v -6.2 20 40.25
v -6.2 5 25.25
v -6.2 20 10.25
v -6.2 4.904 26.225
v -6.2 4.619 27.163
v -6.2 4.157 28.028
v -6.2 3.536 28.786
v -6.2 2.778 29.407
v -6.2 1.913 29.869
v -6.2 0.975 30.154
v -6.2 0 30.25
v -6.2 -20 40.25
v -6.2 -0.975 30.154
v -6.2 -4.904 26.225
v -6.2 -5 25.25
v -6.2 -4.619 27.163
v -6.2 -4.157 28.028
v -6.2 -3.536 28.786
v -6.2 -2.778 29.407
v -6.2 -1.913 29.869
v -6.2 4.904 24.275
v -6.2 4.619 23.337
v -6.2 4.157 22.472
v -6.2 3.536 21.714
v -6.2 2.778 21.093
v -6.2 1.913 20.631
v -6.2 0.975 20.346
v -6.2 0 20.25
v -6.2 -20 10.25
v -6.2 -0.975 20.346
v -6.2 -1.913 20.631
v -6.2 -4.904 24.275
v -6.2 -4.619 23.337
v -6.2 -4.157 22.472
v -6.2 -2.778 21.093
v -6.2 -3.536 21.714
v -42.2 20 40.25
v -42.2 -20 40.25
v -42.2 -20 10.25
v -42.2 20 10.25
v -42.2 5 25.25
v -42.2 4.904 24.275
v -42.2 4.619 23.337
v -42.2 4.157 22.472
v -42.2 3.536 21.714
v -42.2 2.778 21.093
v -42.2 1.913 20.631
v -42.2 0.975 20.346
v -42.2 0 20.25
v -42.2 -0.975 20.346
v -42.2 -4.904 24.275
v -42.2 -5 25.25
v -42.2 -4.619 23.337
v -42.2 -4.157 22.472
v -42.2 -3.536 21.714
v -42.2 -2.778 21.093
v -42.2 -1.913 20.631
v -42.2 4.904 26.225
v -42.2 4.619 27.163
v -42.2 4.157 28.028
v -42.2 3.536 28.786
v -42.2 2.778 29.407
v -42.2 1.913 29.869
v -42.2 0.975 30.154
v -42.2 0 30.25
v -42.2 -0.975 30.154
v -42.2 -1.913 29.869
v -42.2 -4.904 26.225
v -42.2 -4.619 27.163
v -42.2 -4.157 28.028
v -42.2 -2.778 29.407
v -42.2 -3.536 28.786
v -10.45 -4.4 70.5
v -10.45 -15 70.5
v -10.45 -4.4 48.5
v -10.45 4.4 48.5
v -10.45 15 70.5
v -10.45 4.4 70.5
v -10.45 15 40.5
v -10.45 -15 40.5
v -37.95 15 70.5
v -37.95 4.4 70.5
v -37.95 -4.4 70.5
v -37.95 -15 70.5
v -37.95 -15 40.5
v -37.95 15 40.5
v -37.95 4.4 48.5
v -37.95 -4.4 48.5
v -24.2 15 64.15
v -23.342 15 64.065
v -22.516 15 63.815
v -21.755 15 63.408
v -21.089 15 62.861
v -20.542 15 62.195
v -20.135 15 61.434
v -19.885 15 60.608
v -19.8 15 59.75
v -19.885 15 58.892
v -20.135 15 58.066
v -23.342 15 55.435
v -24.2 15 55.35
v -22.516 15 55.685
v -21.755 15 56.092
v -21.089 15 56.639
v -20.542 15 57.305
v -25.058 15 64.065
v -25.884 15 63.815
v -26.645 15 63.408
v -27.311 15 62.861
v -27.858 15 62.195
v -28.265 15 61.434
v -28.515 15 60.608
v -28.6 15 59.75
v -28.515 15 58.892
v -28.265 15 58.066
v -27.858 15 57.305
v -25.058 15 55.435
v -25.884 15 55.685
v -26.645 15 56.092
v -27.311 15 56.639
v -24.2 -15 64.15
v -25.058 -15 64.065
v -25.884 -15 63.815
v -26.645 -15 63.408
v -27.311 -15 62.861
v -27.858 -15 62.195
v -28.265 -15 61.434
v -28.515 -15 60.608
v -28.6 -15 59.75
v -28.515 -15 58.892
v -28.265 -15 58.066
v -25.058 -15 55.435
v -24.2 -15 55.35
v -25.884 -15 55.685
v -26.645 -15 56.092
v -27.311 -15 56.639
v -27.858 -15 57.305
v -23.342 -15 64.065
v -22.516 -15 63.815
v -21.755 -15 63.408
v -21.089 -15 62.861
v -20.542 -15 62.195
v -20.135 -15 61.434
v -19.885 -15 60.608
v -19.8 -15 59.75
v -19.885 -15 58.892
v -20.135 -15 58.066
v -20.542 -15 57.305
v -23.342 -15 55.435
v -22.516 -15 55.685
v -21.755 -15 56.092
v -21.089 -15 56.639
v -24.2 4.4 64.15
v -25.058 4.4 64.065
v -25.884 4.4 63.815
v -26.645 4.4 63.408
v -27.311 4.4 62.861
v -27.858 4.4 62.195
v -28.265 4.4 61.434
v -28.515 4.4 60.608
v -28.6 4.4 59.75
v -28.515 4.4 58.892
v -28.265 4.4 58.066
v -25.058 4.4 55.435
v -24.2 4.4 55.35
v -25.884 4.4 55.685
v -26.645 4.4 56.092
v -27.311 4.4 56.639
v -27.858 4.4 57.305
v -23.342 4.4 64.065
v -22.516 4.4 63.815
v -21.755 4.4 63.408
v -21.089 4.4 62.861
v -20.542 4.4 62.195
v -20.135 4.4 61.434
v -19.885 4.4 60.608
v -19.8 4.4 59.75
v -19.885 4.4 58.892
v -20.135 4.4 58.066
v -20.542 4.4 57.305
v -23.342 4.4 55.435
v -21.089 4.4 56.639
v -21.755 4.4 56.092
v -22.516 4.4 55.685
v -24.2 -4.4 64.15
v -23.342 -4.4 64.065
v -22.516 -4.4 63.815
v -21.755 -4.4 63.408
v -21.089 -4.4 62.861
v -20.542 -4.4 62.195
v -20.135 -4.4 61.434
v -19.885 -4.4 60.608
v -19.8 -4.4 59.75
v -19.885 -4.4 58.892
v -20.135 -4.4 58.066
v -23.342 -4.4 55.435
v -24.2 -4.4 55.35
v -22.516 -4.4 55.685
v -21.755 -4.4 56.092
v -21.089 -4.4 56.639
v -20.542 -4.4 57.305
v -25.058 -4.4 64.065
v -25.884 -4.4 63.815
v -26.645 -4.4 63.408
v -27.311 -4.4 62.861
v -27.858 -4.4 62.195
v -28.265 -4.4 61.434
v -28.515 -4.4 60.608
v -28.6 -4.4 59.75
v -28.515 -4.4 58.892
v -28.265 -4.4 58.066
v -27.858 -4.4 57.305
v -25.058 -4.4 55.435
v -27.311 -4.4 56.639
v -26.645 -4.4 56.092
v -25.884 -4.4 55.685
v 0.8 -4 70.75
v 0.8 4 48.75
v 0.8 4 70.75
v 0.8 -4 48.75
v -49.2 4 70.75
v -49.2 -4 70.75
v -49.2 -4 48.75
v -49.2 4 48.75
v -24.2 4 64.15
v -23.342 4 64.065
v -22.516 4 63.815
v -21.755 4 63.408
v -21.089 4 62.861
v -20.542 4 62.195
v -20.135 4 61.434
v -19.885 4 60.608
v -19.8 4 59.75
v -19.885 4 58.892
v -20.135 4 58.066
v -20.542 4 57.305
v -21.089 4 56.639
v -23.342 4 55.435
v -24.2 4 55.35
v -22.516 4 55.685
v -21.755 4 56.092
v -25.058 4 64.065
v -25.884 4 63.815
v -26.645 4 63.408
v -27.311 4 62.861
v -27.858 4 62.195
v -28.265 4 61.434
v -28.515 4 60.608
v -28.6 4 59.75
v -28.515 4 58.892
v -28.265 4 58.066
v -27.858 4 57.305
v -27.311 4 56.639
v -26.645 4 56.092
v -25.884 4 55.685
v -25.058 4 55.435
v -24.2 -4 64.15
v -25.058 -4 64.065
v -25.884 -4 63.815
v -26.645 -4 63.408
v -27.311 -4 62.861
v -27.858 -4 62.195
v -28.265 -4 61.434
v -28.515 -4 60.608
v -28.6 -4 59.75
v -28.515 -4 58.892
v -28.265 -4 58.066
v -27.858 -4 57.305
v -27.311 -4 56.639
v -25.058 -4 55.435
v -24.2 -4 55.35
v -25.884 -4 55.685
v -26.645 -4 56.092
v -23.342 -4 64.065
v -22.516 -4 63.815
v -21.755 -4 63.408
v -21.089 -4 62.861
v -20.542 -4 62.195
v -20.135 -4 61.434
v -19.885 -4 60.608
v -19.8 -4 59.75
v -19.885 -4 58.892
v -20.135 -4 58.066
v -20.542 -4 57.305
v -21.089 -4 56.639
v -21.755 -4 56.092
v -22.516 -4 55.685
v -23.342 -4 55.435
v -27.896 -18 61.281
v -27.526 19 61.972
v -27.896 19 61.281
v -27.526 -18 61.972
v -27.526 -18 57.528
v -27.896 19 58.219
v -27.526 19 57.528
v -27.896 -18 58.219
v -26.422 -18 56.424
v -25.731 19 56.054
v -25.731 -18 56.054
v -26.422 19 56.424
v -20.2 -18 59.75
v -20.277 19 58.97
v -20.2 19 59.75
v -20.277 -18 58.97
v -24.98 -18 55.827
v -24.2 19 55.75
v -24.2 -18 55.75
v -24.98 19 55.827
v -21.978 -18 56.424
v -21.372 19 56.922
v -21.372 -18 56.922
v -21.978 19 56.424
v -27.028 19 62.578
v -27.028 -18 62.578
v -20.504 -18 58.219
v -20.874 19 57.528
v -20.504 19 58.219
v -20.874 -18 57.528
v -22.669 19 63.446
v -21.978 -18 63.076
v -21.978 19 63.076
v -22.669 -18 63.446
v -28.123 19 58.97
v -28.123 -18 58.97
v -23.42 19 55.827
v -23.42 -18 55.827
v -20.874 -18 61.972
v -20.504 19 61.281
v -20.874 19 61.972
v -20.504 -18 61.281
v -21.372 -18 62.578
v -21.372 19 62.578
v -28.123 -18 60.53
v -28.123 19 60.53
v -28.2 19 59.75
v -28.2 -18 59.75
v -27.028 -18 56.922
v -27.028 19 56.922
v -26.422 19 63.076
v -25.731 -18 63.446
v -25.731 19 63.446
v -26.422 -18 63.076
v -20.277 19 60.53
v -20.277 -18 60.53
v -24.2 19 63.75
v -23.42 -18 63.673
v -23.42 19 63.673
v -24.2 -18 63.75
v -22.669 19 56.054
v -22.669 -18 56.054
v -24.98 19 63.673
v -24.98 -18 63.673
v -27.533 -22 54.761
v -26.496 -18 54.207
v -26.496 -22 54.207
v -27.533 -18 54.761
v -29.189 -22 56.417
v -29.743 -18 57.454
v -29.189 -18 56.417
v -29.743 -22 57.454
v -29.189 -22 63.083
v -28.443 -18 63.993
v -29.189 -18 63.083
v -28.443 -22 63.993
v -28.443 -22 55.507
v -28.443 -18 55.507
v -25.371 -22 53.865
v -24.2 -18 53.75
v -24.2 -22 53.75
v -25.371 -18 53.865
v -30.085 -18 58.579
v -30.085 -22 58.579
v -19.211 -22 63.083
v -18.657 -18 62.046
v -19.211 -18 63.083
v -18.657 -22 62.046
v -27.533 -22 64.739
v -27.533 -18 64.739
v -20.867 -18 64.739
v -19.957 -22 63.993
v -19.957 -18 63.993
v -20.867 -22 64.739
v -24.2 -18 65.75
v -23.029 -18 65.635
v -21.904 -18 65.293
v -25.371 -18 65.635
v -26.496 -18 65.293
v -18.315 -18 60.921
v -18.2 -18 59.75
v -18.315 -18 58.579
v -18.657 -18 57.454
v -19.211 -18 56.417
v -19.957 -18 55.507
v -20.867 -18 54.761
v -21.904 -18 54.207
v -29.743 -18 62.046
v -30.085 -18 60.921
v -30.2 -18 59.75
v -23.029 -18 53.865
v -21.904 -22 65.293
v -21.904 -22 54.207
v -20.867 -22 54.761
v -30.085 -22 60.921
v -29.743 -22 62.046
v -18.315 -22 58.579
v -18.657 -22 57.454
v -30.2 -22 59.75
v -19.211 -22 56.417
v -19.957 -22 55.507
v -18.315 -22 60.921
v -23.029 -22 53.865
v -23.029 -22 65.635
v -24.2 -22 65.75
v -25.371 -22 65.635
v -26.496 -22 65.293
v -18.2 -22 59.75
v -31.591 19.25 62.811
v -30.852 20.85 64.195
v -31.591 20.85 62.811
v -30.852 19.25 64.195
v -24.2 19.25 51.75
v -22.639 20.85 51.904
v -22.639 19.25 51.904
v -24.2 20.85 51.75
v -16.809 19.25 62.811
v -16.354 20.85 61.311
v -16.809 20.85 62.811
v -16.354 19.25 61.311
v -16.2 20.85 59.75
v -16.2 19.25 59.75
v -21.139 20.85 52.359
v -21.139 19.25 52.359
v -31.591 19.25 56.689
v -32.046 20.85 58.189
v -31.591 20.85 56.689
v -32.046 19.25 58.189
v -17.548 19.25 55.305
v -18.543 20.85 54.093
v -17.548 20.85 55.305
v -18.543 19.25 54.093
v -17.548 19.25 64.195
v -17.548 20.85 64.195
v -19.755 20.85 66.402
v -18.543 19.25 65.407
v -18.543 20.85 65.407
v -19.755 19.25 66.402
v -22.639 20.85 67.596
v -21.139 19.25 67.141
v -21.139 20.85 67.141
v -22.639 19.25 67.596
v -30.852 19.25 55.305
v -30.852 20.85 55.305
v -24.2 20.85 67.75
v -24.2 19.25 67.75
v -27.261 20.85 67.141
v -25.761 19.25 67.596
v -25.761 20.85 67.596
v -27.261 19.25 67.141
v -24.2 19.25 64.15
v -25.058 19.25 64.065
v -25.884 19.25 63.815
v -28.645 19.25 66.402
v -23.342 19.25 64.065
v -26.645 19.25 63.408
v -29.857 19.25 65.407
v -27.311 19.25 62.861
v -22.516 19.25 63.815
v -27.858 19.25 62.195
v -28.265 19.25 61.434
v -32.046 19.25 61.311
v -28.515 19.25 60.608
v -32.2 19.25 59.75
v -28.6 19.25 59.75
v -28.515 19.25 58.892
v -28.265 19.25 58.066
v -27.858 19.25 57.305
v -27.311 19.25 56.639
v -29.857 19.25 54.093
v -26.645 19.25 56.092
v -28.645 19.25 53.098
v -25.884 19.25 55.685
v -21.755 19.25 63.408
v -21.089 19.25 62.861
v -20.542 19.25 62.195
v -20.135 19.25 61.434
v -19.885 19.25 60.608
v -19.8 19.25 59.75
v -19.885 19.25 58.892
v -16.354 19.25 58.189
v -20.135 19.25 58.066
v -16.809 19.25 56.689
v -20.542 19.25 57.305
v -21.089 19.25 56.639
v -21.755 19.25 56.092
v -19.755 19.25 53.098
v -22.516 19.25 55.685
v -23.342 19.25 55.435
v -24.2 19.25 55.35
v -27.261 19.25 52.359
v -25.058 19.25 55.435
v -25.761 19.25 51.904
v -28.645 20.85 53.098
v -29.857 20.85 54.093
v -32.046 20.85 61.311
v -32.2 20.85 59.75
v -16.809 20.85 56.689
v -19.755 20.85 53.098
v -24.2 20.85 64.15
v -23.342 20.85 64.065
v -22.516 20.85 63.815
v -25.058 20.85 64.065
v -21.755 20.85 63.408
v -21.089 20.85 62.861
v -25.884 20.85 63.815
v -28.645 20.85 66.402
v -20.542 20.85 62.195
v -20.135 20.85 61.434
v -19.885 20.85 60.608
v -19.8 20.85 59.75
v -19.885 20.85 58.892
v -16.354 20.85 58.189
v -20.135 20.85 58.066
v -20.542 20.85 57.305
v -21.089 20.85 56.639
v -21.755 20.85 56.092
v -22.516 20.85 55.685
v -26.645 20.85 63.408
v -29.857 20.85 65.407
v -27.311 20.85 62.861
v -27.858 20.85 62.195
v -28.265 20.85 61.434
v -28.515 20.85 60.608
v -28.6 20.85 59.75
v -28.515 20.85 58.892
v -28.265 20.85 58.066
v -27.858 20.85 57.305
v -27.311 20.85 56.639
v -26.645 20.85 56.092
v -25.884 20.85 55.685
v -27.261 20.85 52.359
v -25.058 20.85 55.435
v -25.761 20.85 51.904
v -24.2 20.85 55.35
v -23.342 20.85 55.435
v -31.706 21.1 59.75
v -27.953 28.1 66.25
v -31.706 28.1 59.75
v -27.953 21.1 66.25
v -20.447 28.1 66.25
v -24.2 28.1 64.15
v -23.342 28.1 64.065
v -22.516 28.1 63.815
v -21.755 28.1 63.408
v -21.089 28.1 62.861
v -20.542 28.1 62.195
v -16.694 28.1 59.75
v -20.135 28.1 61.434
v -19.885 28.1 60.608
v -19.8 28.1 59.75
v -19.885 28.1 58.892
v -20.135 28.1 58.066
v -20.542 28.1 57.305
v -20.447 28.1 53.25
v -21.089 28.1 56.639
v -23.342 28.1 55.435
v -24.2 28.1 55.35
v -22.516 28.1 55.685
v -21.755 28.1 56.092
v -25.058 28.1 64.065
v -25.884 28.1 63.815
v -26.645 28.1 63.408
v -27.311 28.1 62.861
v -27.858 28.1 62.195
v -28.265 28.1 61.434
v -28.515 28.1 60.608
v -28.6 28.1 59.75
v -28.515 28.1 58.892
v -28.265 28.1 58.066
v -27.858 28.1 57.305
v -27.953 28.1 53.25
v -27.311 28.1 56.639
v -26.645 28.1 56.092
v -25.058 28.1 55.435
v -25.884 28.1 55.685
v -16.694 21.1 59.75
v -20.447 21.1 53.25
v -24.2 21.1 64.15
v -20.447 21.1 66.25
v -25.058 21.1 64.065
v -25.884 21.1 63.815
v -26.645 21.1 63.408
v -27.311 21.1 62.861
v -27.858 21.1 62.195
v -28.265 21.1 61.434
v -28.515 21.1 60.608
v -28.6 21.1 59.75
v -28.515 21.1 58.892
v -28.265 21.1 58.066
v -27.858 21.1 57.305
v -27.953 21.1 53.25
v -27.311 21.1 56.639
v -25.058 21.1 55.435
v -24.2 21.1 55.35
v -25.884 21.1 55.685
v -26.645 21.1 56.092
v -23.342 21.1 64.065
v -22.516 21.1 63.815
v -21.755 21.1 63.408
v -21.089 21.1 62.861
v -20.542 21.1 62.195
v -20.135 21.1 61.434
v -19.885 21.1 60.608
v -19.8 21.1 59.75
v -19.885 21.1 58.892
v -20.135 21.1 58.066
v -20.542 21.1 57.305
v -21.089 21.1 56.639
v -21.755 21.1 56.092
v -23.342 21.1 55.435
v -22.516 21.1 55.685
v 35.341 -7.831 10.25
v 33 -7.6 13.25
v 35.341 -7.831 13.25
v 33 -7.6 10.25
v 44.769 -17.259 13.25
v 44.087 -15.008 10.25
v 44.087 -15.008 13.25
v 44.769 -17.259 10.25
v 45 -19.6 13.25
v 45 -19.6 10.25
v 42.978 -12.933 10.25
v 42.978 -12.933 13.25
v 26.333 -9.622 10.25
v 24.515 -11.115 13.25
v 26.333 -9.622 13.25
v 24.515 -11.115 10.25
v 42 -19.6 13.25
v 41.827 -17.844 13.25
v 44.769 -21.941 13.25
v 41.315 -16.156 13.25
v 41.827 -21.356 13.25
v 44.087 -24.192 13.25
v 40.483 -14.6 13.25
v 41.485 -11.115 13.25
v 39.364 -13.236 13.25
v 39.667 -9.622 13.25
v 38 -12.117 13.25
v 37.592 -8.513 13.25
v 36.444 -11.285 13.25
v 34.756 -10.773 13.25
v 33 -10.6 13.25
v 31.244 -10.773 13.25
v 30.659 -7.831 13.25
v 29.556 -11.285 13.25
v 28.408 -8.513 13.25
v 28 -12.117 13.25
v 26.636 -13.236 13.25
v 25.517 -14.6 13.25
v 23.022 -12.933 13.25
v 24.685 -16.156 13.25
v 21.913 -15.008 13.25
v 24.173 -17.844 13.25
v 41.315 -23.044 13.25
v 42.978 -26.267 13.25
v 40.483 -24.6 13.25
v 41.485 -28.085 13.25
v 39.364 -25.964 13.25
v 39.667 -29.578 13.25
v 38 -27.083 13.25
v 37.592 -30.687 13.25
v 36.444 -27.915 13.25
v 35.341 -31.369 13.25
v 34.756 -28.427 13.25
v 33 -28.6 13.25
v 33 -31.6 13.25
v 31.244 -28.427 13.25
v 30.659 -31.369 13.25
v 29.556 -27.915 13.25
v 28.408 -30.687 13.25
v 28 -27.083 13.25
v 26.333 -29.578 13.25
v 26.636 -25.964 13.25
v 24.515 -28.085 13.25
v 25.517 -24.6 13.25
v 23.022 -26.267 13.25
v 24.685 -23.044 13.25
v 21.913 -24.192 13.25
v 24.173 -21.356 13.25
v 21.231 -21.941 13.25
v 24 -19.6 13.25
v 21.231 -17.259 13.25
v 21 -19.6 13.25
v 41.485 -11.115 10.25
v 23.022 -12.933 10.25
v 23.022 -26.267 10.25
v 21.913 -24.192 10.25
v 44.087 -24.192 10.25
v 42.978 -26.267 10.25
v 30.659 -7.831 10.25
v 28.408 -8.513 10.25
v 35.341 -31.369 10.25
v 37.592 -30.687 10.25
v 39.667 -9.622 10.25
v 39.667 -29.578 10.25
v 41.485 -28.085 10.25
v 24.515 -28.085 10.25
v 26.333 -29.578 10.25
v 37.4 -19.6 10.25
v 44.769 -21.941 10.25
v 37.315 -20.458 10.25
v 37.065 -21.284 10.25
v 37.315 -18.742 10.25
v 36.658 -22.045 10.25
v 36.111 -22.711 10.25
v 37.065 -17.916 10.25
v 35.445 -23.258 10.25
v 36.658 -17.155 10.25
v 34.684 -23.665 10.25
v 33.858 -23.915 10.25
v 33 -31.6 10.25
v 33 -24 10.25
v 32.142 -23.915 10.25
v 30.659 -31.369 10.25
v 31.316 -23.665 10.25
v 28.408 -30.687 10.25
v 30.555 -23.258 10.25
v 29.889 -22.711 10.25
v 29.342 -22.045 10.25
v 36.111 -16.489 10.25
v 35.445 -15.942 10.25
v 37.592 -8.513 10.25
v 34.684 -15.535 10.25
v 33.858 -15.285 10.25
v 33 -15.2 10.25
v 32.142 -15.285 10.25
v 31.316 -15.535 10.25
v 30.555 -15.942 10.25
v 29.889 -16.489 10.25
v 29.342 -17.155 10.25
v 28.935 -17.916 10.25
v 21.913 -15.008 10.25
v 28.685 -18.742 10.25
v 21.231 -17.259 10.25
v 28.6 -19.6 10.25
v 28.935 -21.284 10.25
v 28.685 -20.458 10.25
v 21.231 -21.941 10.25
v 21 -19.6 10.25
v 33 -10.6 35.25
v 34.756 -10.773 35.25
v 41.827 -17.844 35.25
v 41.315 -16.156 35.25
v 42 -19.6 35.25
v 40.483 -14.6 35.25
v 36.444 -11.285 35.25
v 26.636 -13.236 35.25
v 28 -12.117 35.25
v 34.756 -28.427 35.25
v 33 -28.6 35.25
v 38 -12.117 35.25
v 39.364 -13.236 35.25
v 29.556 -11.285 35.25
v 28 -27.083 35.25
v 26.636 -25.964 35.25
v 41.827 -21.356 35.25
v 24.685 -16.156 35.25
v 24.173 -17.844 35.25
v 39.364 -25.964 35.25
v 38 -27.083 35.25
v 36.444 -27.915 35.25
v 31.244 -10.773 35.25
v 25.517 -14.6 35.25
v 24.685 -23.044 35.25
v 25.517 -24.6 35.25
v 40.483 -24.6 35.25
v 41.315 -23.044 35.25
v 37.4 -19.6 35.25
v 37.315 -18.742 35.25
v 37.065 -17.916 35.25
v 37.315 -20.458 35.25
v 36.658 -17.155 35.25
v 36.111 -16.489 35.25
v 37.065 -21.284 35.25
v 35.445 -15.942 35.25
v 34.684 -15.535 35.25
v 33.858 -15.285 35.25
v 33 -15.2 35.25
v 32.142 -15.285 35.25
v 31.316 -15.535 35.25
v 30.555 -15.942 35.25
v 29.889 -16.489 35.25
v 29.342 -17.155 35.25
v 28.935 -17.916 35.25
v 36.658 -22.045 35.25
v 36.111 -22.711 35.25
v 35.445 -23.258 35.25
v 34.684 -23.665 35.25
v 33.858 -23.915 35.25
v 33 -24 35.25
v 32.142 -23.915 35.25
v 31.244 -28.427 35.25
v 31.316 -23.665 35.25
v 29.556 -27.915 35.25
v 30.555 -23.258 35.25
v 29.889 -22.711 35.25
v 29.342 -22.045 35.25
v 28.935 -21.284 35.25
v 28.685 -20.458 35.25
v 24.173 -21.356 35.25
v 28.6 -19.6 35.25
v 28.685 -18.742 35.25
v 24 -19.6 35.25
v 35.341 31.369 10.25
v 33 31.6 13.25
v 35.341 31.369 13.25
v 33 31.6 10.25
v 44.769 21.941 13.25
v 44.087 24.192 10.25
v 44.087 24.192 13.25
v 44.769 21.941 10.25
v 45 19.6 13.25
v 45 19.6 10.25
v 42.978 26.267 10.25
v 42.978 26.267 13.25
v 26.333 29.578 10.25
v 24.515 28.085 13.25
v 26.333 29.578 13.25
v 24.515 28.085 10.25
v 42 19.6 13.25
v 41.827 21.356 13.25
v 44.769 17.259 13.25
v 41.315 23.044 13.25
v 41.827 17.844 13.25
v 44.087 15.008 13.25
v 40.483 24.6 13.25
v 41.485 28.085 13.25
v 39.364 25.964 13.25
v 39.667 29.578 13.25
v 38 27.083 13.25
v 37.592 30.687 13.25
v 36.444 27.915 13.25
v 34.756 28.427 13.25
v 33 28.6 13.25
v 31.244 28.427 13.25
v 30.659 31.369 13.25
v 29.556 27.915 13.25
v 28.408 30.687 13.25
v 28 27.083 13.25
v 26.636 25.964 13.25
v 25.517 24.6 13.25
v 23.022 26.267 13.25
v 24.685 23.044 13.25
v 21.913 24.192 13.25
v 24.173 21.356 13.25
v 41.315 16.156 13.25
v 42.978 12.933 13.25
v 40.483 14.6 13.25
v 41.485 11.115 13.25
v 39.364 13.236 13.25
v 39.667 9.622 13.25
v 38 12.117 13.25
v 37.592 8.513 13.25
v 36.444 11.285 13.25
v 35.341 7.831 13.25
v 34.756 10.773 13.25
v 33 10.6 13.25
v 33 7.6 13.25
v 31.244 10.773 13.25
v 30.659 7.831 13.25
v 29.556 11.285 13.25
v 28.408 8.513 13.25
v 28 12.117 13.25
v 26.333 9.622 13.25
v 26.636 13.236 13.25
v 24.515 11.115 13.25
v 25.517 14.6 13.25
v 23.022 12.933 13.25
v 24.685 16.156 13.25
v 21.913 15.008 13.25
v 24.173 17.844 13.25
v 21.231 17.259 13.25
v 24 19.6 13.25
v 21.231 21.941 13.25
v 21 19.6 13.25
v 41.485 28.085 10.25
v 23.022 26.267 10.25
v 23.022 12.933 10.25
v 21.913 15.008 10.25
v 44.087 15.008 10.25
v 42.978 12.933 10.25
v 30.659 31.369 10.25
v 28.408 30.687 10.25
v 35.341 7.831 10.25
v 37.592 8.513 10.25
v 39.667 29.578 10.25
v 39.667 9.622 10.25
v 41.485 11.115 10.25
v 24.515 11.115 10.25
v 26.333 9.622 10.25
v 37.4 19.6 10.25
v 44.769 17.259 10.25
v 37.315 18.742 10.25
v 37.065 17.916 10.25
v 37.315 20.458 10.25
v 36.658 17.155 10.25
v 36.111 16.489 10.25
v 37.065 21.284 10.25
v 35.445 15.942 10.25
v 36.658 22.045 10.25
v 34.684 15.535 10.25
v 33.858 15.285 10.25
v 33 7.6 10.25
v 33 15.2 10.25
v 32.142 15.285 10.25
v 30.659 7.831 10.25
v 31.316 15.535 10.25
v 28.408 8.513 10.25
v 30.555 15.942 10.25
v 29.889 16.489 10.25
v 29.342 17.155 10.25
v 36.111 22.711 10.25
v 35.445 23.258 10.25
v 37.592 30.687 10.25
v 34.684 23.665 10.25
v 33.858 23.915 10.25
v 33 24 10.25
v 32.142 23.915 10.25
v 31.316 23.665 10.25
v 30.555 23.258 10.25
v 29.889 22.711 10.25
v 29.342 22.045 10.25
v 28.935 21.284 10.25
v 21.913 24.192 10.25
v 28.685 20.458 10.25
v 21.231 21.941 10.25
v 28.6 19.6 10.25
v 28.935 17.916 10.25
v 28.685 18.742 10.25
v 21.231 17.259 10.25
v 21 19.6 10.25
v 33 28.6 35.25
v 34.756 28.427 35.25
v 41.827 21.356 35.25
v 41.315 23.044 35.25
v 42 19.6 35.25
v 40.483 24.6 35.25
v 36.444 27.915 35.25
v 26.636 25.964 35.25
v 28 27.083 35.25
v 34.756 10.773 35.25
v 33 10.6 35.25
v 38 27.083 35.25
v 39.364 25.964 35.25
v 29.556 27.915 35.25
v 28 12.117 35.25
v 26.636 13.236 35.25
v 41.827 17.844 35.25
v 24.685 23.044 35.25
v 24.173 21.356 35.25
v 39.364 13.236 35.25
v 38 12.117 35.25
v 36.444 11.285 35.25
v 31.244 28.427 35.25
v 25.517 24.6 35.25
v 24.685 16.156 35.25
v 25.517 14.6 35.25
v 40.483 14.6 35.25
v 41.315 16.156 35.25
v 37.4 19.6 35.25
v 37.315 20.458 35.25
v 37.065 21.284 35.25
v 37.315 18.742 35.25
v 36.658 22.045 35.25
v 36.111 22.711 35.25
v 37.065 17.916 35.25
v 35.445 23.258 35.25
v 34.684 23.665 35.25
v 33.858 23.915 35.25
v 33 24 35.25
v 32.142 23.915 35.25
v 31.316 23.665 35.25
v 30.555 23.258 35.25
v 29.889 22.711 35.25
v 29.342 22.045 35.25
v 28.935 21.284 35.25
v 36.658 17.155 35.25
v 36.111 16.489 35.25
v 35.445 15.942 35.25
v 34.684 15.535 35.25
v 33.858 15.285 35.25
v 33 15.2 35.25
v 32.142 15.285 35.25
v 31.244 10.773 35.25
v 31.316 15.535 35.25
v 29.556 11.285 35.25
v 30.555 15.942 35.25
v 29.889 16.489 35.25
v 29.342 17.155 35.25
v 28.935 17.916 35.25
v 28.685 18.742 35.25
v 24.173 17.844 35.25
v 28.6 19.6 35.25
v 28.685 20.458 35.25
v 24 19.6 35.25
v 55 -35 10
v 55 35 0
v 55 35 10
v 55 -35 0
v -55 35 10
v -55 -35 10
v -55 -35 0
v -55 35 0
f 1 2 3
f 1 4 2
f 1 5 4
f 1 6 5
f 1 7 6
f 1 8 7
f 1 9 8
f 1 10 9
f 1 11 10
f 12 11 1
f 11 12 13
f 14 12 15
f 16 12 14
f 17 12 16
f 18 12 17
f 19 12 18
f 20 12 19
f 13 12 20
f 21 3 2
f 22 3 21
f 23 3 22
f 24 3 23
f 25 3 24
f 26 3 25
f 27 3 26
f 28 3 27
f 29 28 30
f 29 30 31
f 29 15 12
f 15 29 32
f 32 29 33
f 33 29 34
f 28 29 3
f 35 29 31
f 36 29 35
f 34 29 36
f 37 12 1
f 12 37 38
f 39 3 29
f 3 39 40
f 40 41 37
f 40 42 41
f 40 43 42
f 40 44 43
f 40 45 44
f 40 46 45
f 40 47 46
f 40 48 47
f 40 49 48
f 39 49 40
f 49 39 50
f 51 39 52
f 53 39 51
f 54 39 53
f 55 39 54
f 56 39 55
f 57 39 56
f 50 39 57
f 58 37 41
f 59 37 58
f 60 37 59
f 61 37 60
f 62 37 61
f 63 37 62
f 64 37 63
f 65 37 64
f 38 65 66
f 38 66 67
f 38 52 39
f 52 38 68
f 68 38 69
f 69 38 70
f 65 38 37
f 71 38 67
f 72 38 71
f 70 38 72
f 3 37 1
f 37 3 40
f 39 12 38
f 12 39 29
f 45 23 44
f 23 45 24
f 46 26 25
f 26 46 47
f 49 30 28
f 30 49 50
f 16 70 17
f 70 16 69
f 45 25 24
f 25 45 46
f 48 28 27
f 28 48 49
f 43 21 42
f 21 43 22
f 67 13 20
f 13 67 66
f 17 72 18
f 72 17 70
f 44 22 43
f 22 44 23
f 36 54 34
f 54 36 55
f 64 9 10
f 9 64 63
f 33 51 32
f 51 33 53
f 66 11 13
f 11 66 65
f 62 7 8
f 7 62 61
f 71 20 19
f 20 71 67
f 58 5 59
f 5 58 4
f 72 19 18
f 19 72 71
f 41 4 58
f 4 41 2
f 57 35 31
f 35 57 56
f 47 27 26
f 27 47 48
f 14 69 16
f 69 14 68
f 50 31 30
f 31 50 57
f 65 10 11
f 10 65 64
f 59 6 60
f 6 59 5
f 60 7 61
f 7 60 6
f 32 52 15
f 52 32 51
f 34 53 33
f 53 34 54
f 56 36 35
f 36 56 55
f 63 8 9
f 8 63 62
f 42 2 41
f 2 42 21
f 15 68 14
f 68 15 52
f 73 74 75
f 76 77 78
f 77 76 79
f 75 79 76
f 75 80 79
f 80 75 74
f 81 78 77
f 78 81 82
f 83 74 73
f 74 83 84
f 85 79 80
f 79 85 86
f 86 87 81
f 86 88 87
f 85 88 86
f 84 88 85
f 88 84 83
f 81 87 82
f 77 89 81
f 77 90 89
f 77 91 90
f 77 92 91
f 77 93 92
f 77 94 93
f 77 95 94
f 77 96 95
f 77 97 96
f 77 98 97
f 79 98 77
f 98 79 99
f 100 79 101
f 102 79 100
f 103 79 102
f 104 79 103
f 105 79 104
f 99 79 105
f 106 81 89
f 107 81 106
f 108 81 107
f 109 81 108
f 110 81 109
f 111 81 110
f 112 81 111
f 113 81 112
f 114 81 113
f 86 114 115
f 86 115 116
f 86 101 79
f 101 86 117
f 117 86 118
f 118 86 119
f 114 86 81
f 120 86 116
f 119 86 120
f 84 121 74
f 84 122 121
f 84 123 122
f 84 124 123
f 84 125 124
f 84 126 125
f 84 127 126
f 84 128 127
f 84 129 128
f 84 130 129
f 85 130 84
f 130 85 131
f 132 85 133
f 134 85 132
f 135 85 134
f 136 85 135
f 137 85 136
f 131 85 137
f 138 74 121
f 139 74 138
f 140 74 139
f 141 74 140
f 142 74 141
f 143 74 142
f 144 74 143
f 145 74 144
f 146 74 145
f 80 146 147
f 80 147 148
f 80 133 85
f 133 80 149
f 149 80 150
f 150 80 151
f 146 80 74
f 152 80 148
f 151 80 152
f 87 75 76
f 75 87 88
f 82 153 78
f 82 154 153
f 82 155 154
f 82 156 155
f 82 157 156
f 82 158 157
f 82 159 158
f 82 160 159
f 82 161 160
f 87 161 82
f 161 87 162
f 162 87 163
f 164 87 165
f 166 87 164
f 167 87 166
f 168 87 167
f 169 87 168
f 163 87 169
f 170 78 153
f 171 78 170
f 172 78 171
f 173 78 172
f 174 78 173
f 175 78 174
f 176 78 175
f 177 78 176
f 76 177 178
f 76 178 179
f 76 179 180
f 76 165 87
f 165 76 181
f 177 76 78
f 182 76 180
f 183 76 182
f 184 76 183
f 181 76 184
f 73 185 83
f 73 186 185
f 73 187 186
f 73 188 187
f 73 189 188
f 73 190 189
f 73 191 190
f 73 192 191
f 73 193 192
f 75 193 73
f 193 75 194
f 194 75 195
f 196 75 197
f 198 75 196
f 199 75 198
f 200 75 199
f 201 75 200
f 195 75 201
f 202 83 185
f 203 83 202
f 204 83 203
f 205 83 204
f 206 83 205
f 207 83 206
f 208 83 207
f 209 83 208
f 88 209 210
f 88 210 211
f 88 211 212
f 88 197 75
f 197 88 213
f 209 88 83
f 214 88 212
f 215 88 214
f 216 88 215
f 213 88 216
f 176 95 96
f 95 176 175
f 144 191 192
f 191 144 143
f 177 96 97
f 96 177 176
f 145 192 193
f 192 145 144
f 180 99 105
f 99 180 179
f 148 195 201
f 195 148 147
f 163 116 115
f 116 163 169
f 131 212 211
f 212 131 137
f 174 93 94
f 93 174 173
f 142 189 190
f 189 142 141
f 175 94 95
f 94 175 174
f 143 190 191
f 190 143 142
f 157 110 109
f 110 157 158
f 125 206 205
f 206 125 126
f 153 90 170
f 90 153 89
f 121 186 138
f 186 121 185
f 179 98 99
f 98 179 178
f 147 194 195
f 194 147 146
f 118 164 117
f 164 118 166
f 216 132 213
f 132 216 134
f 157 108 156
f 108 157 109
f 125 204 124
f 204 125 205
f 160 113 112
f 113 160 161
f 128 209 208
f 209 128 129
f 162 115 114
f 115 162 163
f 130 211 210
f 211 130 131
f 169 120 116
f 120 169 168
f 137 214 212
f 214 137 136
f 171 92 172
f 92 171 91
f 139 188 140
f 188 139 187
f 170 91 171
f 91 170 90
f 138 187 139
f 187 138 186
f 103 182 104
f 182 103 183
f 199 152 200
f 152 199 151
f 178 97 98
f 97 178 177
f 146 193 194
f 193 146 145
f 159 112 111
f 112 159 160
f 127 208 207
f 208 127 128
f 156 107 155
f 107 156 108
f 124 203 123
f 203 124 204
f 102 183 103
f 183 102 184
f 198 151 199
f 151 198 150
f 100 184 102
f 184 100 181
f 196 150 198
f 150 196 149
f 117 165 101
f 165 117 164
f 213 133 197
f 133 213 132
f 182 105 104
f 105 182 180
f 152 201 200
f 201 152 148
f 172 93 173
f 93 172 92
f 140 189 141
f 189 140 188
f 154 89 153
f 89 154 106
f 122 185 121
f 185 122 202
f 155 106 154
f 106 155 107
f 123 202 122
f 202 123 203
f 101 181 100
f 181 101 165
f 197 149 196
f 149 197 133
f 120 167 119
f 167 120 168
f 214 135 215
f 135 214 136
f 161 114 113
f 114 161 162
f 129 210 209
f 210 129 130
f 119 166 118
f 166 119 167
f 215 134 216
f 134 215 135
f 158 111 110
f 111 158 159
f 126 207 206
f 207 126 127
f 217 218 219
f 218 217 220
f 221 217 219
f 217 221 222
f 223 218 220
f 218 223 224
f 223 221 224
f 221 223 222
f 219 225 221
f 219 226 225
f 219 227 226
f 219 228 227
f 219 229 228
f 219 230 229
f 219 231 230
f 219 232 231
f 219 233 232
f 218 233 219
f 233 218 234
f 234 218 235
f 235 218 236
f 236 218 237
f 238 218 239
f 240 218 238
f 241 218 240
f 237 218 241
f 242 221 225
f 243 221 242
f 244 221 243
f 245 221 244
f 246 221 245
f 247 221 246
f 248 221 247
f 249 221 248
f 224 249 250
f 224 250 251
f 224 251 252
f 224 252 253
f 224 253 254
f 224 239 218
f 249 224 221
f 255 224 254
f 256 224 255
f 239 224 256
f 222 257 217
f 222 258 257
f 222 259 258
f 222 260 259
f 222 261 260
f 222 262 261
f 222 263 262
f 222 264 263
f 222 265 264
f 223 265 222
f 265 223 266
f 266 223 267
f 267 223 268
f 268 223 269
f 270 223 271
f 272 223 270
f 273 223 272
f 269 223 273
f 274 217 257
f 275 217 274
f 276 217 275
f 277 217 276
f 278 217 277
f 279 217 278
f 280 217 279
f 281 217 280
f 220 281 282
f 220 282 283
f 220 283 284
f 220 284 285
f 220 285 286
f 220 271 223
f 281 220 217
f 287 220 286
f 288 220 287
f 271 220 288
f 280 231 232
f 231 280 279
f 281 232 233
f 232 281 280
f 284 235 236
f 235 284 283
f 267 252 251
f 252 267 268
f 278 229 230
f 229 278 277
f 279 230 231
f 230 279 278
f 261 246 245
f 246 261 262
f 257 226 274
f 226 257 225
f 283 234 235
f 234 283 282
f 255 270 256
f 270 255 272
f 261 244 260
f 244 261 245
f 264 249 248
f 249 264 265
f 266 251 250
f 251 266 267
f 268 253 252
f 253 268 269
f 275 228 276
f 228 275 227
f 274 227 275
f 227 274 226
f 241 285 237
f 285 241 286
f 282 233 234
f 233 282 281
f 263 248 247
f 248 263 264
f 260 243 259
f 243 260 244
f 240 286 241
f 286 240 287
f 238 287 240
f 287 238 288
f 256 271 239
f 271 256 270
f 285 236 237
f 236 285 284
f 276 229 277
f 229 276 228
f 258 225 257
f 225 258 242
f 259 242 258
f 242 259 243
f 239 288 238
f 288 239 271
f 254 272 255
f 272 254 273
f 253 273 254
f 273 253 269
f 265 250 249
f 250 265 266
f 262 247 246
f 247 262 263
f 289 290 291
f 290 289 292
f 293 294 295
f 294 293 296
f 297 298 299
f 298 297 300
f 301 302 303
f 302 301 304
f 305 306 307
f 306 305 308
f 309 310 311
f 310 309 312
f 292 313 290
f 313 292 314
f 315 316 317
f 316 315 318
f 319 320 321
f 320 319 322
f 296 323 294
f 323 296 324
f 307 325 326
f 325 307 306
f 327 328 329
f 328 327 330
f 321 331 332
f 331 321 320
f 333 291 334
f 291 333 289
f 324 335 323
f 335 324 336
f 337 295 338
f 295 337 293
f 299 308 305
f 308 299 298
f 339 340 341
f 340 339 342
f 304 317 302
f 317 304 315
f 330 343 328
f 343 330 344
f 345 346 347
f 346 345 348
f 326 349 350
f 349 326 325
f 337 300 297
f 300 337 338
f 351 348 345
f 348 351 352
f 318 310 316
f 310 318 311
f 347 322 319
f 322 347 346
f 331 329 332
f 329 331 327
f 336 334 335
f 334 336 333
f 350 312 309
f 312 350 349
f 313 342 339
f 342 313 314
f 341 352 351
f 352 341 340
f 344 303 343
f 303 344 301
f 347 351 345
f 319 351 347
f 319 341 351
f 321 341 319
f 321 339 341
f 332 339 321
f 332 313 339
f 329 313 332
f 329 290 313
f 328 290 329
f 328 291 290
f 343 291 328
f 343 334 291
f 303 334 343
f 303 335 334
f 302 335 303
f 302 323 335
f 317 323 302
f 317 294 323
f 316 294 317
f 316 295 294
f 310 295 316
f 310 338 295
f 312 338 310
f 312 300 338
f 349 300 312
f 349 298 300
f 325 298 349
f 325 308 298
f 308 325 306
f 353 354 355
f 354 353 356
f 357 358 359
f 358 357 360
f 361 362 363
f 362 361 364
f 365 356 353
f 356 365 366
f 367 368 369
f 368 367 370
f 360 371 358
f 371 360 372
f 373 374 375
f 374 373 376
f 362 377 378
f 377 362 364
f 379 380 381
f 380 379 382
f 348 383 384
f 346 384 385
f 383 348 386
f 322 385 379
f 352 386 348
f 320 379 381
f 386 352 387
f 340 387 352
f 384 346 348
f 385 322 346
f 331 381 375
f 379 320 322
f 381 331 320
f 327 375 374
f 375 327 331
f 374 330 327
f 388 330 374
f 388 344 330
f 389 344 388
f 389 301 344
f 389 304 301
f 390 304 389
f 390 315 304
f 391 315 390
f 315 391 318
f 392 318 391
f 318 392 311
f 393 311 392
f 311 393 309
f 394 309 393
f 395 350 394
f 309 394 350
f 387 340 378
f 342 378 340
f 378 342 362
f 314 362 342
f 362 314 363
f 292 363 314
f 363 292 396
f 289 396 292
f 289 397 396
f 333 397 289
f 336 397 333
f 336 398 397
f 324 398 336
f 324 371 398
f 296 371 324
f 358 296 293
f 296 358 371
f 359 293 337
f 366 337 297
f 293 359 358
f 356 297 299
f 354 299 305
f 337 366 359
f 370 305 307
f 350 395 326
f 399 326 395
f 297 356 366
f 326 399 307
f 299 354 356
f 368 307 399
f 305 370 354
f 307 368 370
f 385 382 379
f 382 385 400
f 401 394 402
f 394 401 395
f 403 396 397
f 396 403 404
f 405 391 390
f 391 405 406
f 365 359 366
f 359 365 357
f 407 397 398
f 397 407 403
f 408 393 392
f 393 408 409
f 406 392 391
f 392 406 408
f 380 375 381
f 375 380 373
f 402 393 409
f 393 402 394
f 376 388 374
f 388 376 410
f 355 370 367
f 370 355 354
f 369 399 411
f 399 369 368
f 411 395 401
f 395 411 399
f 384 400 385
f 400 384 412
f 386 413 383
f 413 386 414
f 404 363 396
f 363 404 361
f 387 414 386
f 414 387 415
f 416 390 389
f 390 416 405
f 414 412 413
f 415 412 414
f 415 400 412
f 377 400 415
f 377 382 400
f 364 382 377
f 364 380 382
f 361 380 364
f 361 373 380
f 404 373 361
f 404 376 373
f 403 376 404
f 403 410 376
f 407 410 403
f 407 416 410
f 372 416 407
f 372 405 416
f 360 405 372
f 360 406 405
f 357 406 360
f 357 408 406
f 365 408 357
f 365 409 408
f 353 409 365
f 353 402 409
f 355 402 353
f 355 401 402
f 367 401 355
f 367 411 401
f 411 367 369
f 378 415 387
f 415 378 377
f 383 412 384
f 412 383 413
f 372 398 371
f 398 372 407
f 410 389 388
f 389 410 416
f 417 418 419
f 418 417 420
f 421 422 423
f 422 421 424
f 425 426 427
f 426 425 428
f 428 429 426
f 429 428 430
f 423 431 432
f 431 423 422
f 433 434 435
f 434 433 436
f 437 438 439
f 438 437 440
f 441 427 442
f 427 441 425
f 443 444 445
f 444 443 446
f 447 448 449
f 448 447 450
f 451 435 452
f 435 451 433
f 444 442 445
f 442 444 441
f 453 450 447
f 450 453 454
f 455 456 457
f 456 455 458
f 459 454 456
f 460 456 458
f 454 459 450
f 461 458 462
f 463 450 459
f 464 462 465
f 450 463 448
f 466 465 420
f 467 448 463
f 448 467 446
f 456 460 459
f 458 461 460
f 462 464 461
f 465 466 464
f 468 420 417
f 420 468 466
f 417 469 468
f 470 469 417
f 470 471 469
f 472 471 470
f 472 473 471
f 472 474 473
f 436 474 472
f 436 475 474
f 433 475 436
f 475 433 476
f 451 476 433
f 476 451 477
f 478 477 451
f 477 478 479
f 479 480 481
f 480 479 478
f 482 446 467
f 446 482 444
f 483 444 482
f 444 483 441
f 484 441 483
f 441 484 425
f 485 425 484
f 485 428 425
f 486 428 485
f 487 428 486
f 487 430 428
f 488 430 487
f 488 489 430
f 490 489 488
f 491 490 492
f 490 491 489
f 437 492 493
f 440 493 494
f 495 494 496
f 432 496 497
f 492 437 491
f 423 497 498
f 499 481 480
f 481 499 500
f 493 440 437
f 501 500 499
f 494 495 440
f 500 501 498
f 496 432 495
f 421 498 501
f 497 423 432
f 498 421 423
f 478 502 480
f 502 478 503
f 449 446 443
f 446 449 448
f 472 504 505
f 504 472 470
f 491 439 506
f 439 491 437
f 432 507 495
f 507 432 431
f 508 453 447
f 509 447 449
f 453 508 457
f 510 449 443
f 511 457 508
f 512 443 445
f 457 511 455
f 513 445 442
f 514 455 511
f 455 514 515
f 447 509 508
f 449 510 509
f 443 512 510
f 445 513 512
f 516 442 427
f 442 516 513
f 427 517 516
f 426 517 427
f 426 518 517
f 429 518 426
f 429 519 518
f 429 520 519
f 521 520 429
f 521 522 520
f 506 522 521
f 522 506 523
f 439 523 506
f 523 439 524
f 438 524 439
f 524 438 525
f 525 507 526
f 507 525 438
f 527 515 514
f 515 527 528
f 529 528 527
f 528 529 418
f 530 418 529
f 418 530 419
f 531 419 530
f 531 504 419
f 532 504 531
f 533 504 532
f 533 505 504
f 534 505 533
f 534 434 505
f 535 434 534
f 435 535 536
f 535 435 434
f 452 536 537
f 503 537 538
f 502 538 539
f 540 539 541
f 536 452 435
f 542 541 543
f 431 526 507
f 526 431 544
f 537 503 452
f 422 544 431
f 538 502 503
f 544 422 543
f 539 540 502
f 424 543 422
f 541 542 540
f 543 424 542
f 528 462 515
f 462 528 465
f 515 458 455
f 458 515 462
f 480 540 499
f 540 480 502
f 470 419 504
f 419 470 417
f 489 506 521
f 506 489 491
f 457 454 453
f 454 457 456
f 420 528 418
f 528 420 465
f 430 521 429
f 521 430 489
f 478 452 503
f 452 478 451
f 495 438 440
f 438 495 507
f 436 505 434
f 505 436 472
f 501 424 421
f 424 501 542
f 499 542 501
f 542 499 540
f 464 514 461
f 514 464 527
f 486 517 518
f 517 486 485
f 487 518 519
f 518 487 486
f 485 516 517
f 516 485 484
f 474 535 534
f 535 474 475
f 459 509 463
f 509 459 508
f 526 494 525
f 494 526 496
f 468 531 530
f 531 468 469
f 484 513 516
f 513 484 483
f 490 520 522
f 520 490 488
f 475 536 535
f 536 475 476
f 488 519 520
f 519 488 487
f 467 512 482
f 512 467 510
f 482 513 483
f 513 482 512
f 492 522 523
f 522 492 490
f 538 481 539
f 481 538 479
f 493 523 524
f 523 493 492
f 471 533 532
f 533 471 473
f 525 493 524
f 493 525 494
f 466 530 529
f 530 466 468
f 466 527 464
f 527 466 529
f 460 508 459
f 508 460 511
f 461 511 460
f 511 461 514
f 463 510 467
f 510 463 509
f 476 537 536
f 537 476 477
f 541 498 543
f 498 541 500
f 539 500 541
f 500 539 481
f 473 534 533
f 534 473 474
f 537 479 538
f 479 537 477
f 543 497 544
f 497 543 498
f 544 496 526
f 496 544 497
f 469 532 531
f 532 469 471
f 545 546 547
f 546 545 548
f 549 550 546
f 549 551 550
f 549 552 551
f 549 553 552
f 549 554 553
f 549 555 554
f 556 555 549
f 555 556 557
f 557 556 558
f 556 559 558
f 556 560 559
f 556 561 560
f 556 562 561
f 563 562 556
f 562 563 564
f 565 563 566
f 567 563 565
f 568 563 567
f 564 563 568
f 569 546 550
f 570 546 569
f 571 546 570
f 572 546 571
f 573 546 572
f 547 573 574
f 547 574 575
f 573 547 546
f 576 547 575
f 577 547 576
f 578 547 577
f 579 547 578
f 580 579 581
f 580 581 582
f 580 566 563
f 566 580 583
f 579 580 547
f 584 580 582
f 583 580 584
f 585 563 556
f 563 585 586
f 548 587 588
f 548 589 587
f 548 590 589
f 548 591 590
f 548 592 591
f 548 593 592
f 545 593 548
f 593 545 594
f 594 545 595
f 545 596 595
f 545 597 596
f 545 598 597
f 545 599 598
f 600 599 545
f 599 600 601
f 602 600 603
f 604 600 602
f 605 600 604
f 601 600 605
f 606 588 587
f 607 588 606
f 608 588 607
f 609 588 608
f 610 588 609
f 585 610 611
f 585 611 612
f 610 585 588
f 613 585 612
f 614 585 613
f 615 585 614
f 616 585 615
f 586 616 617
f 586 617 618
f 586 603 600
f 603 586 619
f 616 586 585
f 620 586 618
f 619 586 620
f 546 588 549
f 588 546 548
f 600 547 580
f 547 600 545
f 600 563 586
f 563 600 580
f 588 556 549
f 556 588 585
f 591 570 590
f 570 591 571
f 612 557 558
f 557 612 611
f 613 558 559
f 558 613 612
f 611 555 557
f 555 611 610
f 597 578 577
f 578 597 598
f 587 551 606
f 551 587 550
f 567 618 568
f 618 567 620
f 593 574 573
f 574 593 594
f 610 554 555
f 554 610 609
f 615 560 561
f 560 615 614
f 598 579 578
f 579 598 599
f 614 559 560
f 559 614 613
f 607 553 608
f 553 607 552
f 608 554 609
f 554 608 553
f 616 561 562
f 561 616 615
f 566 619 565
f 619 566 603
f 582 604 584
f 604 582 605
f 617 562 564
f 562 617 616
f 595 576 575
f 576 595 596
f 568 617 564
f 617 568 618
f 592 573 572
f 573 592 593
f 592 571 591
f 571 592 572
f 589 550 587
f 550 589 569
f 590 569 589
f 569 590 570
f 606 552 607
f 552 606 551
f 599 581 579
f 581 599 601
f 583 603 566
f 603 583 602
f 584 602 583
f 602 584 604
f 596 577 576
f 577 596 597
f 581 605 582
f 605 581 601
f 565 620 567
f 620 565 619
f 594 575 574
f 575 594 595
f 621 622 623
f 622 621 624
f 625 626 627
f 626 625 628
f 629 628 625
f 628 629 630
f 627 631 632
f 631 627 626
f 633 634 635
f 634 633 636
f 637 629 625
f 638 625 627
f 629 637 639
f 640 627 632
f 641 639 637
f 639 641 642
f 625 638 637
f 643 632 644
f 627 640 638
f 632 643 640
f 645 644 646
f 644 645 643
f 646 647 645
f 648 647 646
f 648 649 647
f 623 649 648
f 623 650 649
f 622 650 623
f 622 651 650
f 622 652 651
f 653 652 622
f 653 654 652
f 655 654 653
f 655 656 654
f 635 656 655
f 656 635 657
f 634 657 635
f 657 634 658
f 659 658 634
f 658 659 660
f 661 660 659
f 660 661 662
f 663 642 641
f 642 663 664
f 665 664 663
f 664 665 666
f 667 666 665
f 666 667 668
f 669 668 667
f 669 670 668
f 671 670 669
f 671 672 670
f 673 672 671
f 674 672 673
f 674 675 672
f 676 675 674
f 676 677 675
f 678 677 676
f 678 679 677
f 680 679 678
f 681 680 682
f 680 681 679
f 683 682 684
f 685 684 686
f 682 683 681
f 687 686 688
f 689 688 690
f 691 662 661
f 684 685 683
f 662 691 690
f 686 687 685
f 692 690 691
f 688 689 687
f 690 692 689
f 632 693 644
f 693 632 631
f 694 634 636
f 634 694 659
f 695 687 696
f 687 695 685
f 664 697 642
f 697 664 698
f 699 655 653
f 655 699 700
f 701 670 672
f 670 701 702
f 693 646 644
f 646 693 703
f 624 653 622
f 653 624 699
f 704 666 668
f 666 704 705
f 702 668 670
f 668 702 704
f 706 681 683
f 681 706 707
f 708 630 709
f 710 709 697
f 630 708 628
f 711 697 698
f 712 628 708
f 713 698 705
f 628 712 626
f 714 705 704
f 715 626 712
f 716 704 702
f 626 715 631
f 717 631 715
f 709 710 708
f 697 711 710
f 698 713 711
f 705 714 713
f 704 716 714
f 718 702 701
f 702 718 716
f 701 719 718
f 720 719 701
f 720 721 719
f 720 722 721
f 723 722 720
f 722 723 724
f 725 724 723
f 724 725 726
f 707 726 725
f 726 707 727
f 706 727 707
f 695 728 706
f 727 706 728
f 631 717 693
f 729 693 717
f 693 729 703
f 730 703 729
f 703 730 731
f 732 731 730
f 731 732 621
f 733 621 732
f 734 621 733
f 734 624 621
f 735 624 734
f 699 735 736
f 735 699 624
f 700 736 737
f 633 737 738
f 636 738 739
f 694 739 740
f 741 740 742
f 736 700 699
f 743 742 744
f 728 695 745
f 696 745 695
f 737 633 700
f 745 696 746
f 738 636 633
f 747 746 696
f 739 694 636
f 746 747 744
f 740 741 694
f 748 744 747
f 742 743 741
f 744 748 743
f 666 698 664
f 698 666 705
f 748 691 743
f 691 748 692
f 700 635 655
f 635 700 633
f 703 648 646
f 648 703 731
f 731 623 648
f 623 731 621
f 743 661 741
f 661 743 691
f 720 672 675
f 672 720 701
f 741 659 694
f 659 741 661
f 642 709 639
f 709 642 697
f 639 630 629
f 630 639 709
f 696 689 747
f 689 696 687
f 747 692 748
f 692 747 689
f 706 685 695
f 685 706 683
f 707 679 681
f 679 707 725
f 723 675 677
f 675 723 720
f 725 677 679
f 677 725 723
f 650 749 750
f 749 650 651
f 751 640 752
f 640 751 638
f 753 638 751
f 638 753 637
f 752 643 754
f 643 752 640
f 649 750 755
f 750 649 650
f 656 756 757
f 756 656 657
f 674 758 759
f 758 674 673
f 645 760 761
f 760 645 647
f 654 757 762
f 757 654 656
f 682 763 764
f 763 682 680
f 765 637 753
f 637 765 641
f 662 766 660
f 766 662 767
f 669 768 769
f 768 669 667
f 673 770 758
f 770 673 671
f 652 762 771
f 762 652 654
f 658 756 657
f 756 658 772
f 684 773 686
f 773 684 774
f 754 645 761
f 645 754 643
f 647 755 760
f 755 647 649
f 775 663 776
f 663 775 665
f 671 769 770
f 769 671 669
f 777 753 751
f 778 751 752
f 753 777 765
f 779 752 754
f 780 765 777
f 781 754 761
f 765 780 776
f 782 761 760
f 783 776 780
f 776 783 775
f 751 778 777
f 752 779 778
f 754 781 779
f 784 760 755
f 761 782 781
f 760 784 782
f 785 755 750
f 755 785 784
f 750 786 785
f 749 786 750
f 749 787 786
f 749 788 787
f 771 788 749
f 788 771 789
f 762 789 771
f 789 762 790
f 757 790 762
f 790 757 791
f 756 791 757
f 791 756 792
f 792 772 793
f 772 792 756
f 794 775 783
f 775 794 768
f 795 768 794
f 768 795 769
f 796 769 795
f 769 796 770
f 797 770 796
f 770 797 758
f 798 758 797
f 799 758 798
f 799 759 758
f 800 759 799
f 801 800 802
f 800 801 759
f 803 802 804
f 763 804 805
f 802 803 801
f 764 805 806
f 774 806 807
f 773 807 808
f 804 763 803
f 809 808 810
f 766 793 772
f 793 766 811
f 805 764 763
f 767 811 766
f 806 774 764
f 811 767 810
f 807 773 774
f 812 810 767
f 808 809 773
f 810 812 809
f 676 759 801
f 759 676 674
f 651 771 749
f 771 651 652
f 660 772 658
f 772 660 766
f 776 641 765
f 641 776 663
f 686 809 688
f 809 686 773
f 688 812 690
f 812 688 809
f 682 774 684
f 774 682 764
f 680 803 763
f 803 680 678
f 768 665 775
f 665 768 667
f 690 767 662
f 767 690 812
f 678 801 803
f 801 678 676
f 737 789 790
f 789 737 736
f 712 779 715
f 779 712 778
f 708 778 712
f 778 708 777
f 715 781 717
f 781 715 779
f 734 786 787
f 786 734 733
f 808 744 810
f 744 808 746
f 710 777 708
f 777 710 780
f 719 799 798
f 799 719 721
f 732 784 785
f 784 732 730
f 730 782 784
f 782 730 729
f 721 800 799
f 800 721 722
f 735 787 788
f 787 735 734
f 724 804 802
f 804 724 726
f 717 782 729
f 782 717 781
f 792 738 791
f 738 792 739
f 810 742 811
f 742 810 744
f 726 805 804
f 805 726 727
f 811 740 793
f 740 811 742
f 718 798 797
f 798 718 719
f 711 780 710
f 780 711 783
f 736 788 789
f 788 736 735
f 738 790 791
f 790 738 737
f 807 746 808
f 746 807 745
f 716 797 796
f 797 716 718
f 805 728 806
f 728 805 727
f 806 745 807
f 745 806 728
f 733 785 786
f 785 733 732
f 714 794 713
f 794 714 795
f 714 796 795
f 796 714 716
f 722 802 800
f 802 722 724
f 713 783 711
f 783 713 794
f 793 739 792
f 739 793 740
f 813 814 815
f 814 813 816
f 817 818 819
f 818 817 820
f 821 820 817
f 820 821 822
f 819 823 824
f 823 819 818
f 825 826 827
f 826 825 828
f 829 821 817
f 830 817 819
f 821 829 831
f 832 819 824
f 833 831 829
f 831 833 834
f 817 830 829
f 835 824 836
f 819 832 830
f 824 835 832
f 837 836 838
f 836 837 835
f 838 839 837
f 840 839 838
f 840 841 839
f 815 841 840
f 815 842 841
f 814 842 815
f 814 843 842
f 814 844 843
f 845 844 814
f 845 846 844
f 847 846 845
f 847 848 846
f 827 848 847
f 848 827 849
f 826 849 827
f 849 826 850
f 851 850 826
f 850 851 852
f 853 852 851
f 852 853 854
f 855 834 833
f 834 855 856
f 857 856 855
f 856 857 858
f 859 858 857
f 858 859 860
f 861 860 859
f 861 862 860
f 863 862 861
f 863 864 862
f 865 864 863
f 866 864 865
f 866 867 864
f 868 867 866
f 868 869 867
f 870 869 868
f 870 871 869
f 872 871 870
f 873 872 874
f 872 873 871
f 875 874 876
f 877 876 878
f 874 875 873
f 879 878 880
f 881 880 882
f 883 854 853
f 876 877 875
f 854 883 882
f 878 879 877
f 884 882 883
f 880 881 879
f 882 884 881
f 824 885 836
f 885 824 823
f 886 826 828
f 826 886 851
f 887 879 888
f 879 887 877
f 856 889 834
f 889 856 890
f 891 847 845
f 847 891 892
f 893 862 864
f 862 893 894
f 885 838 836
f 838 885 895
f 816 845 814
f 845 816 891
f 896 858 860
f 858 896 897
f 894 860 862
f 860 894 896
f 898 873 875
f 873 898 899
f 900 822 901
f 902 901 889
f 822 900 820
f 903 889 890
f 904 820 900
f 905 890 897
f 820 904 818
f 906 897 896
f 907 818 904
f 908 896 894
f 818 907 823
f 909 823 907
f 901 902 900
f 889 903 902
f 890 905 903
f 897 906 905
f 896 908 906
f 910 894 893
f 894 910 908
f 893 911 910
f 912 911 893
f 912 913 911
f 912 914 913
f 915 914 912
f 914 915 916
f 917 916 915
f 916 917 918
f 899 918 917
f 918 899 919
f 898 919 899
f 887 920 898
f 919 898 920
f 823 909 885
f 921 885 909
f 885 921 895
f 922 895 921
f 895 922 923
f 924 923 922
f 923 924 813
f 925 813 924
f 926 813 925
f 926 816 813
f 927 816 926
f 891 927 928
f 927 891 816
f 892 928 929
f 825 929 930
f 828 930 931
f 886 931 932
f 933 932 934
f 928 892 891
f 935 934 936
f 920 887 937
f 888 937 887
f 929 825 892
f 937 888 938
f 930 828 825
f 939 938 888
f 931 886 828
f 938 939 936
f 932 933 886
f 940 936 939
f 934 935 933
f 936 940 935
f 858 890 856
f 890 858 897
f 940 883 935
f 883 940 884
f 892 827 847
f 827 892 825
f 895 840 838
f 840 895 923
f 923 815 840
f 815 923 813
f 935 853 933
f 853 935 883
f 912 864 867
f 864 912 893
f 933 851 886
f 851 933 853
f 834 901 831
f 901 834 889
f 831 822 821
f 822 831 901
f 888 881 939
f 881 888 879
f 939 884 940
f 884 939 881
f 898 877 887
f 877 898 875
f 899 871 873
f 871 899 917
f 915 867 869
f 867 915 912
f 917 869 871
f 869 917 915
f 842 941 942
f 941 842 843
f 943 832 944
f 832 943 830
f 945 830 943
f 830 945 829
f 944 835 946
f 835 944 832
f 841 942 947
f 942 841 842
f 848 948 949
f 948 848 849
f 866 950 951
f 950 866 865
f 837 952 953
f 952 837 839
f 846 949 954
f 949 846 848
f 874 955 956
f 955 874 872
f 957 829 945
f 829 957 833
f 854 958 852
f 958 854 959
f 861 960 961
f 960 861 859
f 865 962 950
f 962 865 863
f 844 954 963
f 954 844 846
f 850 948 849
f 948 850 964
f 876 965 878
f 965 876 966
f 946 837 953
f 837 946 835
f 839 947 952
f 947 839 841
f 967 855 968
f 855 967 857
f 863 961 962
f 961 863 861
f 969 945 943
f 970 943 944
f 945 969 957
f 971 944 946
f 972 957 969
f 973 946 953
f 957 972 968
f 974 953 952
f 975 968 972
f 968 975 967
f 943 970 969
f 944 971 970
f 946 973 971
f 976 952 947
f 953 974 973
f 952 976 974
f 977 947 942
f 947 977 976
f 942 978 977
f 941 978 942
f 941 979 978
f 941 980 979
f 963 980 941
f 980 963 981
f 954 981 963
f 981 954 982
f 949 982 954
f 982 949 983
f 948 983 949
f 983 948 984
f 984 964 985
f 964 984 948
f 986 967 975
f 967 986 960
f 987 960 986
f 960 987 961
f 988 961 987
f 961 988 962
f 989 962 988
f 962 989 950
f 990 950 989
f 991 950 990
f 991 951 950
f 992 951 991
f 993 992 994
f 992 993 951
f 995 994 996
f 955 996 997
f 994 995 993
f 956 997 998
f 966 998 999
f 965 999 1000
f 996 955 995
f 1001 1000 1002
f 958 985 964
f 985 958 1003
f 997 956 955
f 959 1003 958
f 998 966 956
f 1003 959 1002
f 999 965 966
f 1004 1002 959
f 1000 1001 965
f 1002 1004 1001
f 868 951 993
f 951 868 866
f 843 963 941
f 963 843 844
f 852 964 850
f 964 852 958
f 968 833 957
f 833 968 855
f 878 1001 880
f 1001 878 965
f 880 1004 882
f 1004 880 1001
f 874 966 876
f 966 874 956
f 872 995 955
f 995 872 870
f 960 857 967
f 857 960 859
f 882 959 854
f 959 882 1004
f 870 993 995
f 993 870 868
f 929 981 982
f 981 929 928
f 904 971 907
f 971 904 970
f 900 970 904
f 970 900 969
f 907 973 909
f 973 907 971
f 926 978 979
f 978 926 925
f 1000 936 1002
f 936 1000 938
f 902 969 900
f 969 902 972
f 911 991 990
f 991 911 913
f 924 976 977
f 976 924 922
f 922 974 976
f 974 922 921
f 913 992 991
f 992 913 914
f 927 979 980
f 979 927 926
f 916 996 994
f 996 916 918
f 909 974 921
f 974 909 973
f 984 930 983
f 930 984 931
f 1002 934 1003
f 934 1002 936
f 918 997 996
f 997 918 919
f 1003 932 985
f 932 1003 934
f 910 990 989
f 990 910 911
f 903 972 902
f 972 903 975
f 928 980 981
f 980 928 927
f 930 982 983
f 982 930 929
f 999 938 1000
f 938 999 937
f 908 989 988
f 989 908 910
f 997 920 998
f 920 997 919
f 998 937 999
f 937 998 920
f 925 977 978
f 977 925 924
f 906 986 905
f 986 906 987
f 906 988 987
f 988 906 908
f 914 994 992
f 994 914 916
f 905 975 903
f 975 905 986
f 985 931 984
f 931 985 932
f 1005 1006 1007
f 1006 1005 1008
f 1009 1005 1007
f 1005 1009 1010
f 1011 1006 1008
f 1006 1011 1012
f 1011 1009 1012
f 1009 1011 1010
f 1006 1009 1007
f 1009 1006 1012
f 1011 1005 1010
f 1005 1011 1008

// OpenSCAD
$fn = 32;

// ------------------------------------------------------------------------
// Indexing jig: plate 110 x 70 mm, pin d8
// Every part is its own module, assembly() places every instance.
// ------------------------------------------------------------------------

// --- part 1 ---
module jig_plate() {
  difference() {
    translate([-55, -35, 0]) cube([110, 70, 10]);
  }
}

// --- part 2 ---
module locator_block() {
  difference() {
    translate([-18, -20, 0]) cube([36, 40, 30]);
    translate([0, 0, 15]) rotate([0, 90, 0]) cylinder(h = 38, d = 10, center = true);
  }
}

// --- part 3 ---
module index_fork() {
  difference() {
    translate([-13.75, -15, 0]) cube([27.5, 30, 30]);
    translate([-14.75, -4.4, 8]) cube([29.5, 8.8, 23]);
    translate([0, 0, 19.25]) rotate([90, 0, 0]) cylinder(h = 32, d = 8.8, center = true);
  }
}

// --- part 4 ---
module index_arm() {
  difference() {
    translate([-25, -4, 0]) cube([50, 8, 22]);
    translate([0, 0, 11]) rotate([90, 0, 0]) cylinder(h = 10, d = 8.8, center = true);
  }
}

// --- part 5 ---
module index_pin() {
  rotate([0, 90, 0]) cylinder(h = 38, d = 8, center = true);
  translate([-22, 0, 0]) rotate([0, 90, 0]) cylinder(h = 4, d = 12);
}

// --- part 6 ---
module pin_washer() {
  difference() {
      translate([0, 0, 0]) cylinder(h = 1.6, d = 16);
      translate([0, 0, -1]) cylinder(h = 3.6, d = 8.8);
    }
}

// --- part 7 ---
module lock_nut() {
  difference() {
    linear_extrude(height = 7) polygon(points = [[7.506, 0], [3.753, 6.5], [-3.753, 6.5], [-7.506, 0], [-3.753, -6.5], [3.753, -6.5]]);
    translate([0, 0, -1]) cylinder(h = 9, d = 8.8);
  }
}

// --- part 8 ---
module guide_bush_a() {
  difference() {
    union() {
      cylinder(h = 3, d = 24);
      translate([0, 0, 3]) cylinder(h = 22, d = 18);
    }
    translate([0, 0, -1]) cylinder(h = 27, d = 8.8);
  }
}

// --- part 9 ---
module guide_bush_b() {
  difference() {
    union() {
      cylinder(h = 3, d = 24);
      translate([0, 0, 3]) cylinder(h = 22, d = 18);
    }
    translate([0, 0, -1]) cylinder(h = 27, d = 8.8);
  }
}

// --- assembly ---
module assembly() {
  color([0.80, 0.24, 0.20]) translate([0, 0, 0]) rotate([0, 0, 0]) jig_plate();
  color([0.20, 0.45, 0.75]) translate([-24.2, 0, 10.25]) rotate([0, 0, 0]) locator_block();
  color([0.25, 0.62, 0.32]) translate([-24.2, 0, 40.5]) rotate([0, 0, 0]) index_fork();
  color([0.92, 0.70, 0.18]) translate([-24.2, 0, 48.75]) rotate([0, 0, 0]) index_arm();
  color([0.58, 0.35, 0.70]) translate([-24.2, 0, 59.75]) rotate([0, 0, 90]) index_pin();
  color([0.16, 0.66, 0.66]) translate([-24.2, 20.85, 59.75]) rotate([90, 0, 0]) pin_washer();
  color([0.85, 0.48, 0.18]) translate([-24.2, 28.1, 59.75]) rotate([90, 0, 0]) lock_nut();
  color([0.55, 0.60, 0.65]) translate([33, -19.6, 10.25]) rotate([0, 0, 0]) guide_bush_a();
  color([0.75, 0.30, 0.55]) translate([33, 19.6, 10.25]) rotate([0, 0, 0]) guide_bush_b();
}

assembly();
